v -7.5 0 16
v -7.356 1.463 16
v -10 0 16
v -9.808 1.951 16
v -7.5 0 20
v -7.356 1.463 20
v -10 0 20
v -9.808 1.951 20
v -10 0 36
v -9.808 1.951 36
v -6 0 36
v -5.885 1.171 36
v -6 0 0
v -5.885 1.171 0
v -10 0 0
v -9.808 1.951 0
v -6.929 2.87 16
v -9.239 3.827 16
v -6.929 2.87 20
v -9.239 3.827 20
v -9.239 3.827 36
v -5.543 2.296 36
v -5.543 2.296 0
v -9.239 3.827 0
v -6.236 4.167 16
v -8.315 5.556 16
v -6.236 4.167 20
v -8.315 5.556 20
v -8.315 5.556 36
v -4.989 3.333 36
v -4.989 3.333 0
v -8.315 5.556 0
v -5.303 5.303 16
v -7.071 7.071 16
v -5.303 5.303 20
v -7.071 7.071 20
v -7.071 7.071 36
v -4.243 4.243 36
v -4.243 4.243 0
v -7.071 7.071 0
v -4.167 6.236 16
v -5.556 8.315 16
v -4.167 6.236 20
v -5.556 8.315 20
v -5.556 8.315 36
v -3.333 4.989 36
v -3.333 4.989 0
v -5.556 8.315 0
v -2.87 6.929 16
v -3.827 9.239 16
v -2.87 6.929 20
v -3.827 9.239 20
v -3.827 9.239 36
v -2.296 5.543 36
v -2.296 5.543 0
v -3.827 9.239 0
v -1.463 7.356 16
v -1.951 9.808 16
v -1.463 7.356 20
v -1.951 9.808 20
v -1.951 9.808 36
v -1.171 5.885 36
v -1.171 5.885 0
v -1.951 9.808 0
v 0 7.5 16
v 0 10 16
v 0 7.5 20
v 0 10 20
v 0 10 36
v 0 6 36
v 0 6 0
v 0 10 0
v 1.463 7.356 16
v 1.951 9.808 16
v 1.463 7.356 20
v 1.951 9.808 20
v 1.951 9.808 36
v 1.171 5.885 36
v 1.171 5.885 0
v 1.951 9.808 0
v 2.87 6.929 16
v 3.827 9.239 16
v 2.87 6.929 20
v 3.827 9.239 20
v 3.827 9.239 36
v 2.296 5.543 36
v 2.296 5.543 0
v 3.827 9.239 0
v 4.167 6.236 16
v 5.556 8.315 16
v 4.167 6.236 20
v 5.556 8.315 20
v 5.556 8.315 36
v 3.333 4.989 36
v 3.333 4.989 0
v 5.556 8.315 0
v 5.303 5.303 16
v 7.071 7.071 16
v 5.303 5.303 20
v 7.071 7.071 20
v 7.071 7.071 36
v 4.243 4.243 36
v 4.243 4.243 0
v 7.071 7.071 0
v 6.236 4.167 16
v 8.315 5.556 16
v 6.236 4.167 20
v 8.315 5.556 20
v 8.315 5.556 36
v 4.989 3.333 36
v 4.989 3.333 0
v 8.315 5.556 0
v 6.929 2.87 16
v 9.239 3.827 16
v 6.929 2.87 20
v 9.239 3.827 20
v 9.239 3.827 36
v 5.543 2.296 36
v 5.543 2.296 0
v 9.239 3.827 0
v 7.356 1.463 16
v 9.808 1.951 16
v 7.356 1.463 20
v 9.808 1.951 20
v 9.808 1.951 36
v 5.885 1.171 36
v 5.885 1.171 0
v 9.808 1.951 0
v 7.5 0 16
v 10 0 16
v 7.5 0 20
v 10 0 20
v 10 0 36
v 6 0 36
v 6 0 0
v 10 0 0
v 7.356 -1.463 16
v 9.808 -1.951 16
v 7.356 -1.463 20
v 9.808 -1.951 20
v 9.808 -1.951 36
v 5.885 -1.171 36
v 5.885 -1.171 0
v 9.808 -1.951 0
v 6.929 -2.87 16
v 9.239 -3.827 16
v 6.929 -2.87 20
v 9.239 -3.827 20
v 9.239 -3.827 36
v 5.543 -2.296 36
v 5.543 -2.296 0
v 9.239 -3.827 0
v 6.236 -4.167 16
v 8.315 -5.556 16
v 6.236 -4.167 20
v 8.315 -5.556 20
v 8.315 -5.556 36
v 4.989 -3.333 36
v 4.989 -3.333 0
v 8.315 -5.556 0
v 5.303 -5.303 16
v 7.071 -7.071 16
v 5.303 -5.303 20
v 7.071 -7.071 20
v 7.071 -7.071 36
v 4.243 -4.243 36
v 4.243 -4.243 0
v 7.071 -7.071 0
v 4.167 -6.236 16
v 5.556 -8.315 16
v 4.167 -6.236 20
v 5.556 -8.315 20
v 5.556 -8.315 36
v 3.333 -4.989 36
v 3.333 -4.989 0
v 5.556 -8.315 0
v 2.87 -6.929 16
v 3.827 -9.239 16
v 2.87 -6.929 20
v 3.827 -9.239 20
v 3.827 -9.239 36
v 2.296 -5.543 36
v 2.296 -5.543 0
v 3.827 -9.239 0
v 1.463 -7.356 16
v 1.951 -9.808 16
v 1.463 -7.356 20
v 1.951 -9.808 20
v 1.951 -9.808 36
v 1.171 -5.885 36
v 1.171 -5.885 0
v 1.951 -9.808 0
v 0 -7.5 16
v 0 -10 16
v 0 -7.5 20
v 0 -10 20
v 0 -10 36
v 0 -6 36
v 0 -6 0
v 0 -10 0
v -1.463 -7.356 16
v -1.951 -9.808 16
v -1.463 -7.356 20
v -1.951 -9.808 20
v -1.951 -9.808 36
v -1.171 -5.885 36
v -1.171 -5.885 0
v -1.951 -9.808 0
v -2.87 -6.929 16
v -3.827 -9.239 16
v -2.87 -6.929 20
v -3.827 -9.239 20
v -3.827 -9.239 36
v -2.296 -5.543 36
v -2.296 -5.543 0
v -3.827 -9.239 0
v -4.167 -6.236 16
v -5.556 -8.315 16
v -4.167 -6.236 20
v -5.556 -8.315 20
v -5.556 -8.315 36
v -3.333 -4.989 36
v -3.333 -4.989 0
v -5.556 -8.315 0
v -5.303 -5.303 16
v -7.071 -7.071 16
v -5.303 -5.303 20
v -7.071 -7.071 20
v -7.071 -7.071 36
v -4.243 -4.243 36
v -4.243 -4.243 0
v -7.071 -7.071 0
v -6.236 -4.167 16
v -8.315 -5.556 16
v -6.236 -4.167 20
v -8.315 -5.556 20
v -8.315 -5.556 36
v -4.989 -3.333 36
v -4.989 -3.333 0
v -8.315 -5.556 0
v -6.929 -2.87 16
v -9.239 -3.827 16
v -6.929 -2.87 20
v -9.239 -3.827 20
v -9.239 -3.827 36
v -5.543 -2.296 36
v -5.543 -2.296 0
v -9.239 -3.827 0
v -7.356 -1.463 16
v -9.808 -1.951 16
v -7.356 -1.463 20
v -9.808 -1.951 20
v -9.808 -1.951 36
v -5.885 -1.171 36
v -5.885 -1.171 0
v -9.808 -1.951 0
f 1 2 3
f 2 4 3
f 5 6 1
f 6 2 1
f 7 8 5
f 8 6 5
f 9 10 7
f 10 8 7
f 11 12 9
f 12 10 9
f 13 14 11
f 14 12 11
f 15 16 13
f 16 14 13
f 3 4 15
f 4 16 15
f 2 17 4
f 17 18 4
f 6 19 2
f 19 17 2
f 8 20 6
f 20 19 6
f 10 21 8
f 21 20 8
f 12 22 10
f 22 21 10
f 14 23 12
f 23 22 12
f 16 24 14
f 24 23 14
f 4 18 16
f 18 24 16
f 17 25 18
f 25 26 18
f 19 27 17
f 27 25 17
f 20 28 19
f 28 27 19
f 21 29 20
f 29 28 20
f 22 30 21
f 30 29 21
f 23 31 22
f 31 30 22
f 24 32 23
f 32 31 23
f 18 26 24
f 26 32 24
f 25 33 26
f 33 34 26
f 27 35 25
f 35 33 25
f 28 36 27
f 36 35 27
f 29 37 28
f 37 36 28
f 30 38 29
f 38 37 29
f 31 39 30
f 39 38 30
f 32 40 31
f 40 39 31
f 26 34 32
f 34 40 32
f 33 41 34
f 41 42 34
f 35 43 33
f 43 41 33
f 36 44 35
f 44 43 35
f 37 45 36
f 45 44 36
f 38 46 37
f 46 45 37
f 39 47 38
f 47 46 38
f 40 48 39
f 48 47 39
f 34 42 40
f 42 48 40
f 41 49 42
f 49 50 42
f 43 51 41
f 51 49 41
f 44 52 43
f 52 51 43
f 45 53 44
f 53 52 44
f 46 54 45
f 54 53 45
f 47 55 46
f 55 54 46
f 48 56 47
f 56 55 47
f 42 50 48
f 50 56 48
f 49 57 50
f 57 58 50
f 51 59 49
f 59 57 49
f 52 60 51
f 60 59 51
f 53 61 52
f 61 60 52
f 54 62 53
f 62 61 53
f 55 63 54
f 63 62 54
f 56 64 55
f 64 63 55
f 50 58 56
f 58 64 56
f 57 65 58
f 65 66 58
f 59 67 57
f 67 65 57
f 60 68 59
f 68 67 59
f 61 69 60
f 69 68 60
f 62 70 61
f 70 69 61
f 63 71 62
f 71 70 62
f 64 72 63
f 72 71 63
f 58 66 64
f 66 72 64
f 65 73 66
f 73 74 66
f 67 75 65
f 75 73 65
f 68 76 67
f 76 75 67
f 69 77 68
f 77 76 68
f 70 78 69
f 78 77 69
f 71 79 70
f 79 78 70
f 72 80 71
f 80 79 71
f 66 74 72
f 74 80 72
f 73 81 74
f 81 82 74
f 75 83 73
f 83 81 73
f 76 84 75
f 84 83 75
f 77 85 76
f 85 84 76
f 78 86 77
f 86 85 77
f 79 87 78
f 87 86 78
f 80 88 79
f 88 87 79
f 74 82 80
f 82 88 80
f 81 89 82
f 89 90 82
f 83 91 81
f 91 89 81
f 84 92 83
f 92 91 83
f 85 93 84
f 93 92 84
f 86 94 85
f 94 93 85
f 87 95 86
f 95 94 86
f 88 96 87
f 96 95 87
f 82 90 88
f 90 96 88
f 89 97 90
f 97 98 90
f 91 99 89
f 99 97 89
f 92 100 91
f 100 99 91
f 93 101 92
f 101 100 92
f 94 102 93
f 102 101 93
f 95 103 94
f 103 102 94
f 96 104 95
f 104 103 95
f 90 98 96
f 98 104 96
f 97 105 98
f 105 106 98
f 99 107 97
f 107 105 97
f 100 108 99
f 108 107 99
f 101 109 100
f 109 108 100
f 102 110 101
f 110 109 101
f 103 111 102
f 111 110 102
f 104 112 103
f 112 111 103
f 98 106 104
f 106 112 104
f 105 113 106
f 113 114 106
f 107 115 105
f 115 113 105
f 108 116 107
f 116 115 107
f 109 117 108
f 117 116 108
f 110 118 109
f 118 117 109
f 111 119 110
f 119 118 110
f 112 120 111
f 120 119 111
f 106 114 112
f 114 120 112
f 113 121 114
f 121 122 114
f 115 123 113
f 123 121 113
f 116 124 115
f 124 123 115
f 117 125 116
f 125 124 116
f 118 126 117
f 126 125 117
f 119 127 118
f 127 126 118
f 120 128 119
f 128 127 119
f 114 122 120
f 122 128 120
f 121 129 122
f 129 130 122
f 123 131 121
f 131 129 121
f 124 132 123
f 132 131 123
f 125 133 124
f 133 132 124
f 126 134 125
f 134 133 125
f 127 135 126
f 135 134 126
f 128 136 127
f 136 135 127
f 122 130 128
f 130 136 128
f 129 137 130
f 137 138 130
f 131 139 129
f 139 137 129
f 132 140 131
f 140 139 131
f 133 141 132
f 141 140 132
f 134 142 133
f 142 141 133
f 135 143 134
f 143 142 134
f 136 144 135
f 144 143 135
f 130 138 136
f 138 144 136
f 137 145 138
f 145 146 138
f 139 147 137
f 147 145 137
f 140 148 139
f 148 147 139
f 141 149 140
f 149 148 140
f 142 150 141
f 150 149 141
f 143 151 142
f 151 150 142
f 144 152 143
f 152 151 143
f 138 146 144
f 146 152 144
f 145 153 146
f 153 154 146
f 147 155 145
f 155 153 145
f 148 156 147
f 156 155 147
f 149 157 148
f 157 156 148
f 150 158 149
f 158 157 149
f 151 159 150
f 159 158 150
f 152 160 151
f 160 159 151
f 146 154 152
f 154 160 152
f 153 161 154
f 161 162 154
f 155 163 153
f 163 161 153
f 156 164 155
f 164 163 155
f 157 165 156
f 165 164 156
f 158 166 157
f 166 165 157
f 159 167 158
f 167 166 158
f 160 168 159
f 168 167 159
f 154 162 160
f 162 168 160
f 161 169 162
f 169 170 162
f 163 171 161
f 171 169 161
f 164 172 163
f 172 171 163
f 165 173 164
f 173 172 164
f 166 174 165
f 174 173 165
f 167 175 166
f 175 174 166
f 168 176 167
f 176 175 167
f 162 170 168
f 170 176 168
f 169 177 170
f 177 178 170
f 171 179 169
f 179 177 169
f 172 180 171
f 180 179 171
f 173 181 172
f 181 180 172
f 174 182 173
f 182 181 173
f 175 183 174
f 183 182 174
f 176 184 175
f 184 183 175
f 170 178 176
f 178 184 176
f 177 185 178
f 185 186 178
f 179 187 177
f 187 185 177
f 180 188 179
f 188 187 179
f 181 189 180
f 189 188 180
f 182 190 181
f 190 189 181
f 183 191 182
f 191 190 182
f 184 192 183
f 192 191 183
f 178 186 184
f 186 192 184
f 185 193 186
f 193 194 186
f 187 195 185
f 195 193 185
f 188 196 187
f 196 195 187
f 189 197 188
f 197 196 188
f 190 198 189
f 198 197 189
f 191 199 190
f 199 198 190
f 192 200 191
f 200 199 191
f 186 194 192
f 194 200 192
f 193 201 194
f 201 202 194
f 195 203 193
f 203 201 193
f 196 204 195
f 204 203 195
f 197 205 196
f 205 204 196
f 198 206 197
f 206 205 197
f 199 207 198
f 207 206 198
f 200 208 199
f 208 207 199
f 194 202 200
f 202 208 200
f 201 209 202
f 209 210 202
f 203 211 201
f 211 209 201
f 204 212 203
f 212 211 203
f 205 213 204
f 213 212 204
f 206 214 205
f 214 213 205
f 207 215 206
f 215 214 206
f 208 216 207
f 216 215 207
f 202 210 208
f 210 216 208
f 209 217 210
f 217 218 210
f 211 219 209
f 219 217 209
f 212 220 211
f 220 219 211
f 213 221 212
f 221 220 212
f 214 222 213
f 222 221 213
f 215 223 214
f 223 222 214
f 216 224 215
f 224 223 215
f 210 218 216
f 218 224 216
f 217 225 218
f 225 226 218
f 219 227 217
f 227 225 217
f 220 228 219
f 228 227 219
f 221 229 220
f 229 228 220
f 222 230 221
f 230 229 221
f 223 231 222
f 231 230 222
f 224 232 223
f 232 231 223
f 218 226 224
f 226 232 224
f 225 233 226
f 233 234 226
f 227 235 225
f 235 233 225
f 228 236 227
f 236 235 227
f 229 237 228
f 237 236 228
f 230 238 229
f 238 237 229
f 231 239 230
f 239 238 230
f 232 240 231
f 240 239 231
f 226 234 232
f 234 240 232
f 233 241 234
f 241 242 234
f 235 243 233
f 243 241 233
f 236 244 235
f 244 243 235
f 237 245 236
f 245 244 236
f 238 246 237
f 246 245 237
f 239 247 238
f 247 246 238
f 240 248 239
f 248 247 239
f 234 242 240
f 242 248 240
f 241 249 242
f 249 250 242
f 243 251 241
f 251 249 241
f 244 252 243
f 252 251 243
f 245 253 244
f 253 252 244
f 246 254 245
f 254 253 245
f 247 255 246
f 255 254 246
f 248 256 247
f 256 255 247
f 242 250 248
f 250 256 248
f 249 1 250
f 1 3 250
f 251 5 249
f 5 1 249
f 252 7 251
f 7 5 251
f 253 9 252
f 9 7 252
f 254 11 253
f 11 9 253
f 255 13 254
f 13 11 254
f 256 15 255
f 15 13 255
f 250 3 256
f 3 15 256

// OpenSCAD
$fn = 32;

// ----------------------------------------------------------------------
// Grooved revolve: plain_grooves, bore R6
// ----------------------------------------------------------------------

// --- parameters (mm) ---
bore_r = 6;               // bore radius
outer_r = 10;             // outer radius of the body
total_h = 36;             // overall height, Z
wall = 4;                 // radial wall thickness
groove_w = 4;             // groove width
groove_d = 2.5;           // groove depth
grooves = 1;              // number of outer grooves

bbox_x = 2 * outer_r;  // full diameter
bore_d = 2 * bore_r;  // bore diameter
body_d = 2 * outer_r;  // body diameter
revolve_angle = 360;  // full turn around the Z axis

profile = [[6, 0], [10, 0], [10, 16], [7.5, 16], [7.5, 20], [10, 20], [10, 36], [6, 36]];  // primary outline, 8 points, counter clockwise

// --- the one profile operation ---
rotate_extrude(angle = revolve_angle) polygon(points = profile);
